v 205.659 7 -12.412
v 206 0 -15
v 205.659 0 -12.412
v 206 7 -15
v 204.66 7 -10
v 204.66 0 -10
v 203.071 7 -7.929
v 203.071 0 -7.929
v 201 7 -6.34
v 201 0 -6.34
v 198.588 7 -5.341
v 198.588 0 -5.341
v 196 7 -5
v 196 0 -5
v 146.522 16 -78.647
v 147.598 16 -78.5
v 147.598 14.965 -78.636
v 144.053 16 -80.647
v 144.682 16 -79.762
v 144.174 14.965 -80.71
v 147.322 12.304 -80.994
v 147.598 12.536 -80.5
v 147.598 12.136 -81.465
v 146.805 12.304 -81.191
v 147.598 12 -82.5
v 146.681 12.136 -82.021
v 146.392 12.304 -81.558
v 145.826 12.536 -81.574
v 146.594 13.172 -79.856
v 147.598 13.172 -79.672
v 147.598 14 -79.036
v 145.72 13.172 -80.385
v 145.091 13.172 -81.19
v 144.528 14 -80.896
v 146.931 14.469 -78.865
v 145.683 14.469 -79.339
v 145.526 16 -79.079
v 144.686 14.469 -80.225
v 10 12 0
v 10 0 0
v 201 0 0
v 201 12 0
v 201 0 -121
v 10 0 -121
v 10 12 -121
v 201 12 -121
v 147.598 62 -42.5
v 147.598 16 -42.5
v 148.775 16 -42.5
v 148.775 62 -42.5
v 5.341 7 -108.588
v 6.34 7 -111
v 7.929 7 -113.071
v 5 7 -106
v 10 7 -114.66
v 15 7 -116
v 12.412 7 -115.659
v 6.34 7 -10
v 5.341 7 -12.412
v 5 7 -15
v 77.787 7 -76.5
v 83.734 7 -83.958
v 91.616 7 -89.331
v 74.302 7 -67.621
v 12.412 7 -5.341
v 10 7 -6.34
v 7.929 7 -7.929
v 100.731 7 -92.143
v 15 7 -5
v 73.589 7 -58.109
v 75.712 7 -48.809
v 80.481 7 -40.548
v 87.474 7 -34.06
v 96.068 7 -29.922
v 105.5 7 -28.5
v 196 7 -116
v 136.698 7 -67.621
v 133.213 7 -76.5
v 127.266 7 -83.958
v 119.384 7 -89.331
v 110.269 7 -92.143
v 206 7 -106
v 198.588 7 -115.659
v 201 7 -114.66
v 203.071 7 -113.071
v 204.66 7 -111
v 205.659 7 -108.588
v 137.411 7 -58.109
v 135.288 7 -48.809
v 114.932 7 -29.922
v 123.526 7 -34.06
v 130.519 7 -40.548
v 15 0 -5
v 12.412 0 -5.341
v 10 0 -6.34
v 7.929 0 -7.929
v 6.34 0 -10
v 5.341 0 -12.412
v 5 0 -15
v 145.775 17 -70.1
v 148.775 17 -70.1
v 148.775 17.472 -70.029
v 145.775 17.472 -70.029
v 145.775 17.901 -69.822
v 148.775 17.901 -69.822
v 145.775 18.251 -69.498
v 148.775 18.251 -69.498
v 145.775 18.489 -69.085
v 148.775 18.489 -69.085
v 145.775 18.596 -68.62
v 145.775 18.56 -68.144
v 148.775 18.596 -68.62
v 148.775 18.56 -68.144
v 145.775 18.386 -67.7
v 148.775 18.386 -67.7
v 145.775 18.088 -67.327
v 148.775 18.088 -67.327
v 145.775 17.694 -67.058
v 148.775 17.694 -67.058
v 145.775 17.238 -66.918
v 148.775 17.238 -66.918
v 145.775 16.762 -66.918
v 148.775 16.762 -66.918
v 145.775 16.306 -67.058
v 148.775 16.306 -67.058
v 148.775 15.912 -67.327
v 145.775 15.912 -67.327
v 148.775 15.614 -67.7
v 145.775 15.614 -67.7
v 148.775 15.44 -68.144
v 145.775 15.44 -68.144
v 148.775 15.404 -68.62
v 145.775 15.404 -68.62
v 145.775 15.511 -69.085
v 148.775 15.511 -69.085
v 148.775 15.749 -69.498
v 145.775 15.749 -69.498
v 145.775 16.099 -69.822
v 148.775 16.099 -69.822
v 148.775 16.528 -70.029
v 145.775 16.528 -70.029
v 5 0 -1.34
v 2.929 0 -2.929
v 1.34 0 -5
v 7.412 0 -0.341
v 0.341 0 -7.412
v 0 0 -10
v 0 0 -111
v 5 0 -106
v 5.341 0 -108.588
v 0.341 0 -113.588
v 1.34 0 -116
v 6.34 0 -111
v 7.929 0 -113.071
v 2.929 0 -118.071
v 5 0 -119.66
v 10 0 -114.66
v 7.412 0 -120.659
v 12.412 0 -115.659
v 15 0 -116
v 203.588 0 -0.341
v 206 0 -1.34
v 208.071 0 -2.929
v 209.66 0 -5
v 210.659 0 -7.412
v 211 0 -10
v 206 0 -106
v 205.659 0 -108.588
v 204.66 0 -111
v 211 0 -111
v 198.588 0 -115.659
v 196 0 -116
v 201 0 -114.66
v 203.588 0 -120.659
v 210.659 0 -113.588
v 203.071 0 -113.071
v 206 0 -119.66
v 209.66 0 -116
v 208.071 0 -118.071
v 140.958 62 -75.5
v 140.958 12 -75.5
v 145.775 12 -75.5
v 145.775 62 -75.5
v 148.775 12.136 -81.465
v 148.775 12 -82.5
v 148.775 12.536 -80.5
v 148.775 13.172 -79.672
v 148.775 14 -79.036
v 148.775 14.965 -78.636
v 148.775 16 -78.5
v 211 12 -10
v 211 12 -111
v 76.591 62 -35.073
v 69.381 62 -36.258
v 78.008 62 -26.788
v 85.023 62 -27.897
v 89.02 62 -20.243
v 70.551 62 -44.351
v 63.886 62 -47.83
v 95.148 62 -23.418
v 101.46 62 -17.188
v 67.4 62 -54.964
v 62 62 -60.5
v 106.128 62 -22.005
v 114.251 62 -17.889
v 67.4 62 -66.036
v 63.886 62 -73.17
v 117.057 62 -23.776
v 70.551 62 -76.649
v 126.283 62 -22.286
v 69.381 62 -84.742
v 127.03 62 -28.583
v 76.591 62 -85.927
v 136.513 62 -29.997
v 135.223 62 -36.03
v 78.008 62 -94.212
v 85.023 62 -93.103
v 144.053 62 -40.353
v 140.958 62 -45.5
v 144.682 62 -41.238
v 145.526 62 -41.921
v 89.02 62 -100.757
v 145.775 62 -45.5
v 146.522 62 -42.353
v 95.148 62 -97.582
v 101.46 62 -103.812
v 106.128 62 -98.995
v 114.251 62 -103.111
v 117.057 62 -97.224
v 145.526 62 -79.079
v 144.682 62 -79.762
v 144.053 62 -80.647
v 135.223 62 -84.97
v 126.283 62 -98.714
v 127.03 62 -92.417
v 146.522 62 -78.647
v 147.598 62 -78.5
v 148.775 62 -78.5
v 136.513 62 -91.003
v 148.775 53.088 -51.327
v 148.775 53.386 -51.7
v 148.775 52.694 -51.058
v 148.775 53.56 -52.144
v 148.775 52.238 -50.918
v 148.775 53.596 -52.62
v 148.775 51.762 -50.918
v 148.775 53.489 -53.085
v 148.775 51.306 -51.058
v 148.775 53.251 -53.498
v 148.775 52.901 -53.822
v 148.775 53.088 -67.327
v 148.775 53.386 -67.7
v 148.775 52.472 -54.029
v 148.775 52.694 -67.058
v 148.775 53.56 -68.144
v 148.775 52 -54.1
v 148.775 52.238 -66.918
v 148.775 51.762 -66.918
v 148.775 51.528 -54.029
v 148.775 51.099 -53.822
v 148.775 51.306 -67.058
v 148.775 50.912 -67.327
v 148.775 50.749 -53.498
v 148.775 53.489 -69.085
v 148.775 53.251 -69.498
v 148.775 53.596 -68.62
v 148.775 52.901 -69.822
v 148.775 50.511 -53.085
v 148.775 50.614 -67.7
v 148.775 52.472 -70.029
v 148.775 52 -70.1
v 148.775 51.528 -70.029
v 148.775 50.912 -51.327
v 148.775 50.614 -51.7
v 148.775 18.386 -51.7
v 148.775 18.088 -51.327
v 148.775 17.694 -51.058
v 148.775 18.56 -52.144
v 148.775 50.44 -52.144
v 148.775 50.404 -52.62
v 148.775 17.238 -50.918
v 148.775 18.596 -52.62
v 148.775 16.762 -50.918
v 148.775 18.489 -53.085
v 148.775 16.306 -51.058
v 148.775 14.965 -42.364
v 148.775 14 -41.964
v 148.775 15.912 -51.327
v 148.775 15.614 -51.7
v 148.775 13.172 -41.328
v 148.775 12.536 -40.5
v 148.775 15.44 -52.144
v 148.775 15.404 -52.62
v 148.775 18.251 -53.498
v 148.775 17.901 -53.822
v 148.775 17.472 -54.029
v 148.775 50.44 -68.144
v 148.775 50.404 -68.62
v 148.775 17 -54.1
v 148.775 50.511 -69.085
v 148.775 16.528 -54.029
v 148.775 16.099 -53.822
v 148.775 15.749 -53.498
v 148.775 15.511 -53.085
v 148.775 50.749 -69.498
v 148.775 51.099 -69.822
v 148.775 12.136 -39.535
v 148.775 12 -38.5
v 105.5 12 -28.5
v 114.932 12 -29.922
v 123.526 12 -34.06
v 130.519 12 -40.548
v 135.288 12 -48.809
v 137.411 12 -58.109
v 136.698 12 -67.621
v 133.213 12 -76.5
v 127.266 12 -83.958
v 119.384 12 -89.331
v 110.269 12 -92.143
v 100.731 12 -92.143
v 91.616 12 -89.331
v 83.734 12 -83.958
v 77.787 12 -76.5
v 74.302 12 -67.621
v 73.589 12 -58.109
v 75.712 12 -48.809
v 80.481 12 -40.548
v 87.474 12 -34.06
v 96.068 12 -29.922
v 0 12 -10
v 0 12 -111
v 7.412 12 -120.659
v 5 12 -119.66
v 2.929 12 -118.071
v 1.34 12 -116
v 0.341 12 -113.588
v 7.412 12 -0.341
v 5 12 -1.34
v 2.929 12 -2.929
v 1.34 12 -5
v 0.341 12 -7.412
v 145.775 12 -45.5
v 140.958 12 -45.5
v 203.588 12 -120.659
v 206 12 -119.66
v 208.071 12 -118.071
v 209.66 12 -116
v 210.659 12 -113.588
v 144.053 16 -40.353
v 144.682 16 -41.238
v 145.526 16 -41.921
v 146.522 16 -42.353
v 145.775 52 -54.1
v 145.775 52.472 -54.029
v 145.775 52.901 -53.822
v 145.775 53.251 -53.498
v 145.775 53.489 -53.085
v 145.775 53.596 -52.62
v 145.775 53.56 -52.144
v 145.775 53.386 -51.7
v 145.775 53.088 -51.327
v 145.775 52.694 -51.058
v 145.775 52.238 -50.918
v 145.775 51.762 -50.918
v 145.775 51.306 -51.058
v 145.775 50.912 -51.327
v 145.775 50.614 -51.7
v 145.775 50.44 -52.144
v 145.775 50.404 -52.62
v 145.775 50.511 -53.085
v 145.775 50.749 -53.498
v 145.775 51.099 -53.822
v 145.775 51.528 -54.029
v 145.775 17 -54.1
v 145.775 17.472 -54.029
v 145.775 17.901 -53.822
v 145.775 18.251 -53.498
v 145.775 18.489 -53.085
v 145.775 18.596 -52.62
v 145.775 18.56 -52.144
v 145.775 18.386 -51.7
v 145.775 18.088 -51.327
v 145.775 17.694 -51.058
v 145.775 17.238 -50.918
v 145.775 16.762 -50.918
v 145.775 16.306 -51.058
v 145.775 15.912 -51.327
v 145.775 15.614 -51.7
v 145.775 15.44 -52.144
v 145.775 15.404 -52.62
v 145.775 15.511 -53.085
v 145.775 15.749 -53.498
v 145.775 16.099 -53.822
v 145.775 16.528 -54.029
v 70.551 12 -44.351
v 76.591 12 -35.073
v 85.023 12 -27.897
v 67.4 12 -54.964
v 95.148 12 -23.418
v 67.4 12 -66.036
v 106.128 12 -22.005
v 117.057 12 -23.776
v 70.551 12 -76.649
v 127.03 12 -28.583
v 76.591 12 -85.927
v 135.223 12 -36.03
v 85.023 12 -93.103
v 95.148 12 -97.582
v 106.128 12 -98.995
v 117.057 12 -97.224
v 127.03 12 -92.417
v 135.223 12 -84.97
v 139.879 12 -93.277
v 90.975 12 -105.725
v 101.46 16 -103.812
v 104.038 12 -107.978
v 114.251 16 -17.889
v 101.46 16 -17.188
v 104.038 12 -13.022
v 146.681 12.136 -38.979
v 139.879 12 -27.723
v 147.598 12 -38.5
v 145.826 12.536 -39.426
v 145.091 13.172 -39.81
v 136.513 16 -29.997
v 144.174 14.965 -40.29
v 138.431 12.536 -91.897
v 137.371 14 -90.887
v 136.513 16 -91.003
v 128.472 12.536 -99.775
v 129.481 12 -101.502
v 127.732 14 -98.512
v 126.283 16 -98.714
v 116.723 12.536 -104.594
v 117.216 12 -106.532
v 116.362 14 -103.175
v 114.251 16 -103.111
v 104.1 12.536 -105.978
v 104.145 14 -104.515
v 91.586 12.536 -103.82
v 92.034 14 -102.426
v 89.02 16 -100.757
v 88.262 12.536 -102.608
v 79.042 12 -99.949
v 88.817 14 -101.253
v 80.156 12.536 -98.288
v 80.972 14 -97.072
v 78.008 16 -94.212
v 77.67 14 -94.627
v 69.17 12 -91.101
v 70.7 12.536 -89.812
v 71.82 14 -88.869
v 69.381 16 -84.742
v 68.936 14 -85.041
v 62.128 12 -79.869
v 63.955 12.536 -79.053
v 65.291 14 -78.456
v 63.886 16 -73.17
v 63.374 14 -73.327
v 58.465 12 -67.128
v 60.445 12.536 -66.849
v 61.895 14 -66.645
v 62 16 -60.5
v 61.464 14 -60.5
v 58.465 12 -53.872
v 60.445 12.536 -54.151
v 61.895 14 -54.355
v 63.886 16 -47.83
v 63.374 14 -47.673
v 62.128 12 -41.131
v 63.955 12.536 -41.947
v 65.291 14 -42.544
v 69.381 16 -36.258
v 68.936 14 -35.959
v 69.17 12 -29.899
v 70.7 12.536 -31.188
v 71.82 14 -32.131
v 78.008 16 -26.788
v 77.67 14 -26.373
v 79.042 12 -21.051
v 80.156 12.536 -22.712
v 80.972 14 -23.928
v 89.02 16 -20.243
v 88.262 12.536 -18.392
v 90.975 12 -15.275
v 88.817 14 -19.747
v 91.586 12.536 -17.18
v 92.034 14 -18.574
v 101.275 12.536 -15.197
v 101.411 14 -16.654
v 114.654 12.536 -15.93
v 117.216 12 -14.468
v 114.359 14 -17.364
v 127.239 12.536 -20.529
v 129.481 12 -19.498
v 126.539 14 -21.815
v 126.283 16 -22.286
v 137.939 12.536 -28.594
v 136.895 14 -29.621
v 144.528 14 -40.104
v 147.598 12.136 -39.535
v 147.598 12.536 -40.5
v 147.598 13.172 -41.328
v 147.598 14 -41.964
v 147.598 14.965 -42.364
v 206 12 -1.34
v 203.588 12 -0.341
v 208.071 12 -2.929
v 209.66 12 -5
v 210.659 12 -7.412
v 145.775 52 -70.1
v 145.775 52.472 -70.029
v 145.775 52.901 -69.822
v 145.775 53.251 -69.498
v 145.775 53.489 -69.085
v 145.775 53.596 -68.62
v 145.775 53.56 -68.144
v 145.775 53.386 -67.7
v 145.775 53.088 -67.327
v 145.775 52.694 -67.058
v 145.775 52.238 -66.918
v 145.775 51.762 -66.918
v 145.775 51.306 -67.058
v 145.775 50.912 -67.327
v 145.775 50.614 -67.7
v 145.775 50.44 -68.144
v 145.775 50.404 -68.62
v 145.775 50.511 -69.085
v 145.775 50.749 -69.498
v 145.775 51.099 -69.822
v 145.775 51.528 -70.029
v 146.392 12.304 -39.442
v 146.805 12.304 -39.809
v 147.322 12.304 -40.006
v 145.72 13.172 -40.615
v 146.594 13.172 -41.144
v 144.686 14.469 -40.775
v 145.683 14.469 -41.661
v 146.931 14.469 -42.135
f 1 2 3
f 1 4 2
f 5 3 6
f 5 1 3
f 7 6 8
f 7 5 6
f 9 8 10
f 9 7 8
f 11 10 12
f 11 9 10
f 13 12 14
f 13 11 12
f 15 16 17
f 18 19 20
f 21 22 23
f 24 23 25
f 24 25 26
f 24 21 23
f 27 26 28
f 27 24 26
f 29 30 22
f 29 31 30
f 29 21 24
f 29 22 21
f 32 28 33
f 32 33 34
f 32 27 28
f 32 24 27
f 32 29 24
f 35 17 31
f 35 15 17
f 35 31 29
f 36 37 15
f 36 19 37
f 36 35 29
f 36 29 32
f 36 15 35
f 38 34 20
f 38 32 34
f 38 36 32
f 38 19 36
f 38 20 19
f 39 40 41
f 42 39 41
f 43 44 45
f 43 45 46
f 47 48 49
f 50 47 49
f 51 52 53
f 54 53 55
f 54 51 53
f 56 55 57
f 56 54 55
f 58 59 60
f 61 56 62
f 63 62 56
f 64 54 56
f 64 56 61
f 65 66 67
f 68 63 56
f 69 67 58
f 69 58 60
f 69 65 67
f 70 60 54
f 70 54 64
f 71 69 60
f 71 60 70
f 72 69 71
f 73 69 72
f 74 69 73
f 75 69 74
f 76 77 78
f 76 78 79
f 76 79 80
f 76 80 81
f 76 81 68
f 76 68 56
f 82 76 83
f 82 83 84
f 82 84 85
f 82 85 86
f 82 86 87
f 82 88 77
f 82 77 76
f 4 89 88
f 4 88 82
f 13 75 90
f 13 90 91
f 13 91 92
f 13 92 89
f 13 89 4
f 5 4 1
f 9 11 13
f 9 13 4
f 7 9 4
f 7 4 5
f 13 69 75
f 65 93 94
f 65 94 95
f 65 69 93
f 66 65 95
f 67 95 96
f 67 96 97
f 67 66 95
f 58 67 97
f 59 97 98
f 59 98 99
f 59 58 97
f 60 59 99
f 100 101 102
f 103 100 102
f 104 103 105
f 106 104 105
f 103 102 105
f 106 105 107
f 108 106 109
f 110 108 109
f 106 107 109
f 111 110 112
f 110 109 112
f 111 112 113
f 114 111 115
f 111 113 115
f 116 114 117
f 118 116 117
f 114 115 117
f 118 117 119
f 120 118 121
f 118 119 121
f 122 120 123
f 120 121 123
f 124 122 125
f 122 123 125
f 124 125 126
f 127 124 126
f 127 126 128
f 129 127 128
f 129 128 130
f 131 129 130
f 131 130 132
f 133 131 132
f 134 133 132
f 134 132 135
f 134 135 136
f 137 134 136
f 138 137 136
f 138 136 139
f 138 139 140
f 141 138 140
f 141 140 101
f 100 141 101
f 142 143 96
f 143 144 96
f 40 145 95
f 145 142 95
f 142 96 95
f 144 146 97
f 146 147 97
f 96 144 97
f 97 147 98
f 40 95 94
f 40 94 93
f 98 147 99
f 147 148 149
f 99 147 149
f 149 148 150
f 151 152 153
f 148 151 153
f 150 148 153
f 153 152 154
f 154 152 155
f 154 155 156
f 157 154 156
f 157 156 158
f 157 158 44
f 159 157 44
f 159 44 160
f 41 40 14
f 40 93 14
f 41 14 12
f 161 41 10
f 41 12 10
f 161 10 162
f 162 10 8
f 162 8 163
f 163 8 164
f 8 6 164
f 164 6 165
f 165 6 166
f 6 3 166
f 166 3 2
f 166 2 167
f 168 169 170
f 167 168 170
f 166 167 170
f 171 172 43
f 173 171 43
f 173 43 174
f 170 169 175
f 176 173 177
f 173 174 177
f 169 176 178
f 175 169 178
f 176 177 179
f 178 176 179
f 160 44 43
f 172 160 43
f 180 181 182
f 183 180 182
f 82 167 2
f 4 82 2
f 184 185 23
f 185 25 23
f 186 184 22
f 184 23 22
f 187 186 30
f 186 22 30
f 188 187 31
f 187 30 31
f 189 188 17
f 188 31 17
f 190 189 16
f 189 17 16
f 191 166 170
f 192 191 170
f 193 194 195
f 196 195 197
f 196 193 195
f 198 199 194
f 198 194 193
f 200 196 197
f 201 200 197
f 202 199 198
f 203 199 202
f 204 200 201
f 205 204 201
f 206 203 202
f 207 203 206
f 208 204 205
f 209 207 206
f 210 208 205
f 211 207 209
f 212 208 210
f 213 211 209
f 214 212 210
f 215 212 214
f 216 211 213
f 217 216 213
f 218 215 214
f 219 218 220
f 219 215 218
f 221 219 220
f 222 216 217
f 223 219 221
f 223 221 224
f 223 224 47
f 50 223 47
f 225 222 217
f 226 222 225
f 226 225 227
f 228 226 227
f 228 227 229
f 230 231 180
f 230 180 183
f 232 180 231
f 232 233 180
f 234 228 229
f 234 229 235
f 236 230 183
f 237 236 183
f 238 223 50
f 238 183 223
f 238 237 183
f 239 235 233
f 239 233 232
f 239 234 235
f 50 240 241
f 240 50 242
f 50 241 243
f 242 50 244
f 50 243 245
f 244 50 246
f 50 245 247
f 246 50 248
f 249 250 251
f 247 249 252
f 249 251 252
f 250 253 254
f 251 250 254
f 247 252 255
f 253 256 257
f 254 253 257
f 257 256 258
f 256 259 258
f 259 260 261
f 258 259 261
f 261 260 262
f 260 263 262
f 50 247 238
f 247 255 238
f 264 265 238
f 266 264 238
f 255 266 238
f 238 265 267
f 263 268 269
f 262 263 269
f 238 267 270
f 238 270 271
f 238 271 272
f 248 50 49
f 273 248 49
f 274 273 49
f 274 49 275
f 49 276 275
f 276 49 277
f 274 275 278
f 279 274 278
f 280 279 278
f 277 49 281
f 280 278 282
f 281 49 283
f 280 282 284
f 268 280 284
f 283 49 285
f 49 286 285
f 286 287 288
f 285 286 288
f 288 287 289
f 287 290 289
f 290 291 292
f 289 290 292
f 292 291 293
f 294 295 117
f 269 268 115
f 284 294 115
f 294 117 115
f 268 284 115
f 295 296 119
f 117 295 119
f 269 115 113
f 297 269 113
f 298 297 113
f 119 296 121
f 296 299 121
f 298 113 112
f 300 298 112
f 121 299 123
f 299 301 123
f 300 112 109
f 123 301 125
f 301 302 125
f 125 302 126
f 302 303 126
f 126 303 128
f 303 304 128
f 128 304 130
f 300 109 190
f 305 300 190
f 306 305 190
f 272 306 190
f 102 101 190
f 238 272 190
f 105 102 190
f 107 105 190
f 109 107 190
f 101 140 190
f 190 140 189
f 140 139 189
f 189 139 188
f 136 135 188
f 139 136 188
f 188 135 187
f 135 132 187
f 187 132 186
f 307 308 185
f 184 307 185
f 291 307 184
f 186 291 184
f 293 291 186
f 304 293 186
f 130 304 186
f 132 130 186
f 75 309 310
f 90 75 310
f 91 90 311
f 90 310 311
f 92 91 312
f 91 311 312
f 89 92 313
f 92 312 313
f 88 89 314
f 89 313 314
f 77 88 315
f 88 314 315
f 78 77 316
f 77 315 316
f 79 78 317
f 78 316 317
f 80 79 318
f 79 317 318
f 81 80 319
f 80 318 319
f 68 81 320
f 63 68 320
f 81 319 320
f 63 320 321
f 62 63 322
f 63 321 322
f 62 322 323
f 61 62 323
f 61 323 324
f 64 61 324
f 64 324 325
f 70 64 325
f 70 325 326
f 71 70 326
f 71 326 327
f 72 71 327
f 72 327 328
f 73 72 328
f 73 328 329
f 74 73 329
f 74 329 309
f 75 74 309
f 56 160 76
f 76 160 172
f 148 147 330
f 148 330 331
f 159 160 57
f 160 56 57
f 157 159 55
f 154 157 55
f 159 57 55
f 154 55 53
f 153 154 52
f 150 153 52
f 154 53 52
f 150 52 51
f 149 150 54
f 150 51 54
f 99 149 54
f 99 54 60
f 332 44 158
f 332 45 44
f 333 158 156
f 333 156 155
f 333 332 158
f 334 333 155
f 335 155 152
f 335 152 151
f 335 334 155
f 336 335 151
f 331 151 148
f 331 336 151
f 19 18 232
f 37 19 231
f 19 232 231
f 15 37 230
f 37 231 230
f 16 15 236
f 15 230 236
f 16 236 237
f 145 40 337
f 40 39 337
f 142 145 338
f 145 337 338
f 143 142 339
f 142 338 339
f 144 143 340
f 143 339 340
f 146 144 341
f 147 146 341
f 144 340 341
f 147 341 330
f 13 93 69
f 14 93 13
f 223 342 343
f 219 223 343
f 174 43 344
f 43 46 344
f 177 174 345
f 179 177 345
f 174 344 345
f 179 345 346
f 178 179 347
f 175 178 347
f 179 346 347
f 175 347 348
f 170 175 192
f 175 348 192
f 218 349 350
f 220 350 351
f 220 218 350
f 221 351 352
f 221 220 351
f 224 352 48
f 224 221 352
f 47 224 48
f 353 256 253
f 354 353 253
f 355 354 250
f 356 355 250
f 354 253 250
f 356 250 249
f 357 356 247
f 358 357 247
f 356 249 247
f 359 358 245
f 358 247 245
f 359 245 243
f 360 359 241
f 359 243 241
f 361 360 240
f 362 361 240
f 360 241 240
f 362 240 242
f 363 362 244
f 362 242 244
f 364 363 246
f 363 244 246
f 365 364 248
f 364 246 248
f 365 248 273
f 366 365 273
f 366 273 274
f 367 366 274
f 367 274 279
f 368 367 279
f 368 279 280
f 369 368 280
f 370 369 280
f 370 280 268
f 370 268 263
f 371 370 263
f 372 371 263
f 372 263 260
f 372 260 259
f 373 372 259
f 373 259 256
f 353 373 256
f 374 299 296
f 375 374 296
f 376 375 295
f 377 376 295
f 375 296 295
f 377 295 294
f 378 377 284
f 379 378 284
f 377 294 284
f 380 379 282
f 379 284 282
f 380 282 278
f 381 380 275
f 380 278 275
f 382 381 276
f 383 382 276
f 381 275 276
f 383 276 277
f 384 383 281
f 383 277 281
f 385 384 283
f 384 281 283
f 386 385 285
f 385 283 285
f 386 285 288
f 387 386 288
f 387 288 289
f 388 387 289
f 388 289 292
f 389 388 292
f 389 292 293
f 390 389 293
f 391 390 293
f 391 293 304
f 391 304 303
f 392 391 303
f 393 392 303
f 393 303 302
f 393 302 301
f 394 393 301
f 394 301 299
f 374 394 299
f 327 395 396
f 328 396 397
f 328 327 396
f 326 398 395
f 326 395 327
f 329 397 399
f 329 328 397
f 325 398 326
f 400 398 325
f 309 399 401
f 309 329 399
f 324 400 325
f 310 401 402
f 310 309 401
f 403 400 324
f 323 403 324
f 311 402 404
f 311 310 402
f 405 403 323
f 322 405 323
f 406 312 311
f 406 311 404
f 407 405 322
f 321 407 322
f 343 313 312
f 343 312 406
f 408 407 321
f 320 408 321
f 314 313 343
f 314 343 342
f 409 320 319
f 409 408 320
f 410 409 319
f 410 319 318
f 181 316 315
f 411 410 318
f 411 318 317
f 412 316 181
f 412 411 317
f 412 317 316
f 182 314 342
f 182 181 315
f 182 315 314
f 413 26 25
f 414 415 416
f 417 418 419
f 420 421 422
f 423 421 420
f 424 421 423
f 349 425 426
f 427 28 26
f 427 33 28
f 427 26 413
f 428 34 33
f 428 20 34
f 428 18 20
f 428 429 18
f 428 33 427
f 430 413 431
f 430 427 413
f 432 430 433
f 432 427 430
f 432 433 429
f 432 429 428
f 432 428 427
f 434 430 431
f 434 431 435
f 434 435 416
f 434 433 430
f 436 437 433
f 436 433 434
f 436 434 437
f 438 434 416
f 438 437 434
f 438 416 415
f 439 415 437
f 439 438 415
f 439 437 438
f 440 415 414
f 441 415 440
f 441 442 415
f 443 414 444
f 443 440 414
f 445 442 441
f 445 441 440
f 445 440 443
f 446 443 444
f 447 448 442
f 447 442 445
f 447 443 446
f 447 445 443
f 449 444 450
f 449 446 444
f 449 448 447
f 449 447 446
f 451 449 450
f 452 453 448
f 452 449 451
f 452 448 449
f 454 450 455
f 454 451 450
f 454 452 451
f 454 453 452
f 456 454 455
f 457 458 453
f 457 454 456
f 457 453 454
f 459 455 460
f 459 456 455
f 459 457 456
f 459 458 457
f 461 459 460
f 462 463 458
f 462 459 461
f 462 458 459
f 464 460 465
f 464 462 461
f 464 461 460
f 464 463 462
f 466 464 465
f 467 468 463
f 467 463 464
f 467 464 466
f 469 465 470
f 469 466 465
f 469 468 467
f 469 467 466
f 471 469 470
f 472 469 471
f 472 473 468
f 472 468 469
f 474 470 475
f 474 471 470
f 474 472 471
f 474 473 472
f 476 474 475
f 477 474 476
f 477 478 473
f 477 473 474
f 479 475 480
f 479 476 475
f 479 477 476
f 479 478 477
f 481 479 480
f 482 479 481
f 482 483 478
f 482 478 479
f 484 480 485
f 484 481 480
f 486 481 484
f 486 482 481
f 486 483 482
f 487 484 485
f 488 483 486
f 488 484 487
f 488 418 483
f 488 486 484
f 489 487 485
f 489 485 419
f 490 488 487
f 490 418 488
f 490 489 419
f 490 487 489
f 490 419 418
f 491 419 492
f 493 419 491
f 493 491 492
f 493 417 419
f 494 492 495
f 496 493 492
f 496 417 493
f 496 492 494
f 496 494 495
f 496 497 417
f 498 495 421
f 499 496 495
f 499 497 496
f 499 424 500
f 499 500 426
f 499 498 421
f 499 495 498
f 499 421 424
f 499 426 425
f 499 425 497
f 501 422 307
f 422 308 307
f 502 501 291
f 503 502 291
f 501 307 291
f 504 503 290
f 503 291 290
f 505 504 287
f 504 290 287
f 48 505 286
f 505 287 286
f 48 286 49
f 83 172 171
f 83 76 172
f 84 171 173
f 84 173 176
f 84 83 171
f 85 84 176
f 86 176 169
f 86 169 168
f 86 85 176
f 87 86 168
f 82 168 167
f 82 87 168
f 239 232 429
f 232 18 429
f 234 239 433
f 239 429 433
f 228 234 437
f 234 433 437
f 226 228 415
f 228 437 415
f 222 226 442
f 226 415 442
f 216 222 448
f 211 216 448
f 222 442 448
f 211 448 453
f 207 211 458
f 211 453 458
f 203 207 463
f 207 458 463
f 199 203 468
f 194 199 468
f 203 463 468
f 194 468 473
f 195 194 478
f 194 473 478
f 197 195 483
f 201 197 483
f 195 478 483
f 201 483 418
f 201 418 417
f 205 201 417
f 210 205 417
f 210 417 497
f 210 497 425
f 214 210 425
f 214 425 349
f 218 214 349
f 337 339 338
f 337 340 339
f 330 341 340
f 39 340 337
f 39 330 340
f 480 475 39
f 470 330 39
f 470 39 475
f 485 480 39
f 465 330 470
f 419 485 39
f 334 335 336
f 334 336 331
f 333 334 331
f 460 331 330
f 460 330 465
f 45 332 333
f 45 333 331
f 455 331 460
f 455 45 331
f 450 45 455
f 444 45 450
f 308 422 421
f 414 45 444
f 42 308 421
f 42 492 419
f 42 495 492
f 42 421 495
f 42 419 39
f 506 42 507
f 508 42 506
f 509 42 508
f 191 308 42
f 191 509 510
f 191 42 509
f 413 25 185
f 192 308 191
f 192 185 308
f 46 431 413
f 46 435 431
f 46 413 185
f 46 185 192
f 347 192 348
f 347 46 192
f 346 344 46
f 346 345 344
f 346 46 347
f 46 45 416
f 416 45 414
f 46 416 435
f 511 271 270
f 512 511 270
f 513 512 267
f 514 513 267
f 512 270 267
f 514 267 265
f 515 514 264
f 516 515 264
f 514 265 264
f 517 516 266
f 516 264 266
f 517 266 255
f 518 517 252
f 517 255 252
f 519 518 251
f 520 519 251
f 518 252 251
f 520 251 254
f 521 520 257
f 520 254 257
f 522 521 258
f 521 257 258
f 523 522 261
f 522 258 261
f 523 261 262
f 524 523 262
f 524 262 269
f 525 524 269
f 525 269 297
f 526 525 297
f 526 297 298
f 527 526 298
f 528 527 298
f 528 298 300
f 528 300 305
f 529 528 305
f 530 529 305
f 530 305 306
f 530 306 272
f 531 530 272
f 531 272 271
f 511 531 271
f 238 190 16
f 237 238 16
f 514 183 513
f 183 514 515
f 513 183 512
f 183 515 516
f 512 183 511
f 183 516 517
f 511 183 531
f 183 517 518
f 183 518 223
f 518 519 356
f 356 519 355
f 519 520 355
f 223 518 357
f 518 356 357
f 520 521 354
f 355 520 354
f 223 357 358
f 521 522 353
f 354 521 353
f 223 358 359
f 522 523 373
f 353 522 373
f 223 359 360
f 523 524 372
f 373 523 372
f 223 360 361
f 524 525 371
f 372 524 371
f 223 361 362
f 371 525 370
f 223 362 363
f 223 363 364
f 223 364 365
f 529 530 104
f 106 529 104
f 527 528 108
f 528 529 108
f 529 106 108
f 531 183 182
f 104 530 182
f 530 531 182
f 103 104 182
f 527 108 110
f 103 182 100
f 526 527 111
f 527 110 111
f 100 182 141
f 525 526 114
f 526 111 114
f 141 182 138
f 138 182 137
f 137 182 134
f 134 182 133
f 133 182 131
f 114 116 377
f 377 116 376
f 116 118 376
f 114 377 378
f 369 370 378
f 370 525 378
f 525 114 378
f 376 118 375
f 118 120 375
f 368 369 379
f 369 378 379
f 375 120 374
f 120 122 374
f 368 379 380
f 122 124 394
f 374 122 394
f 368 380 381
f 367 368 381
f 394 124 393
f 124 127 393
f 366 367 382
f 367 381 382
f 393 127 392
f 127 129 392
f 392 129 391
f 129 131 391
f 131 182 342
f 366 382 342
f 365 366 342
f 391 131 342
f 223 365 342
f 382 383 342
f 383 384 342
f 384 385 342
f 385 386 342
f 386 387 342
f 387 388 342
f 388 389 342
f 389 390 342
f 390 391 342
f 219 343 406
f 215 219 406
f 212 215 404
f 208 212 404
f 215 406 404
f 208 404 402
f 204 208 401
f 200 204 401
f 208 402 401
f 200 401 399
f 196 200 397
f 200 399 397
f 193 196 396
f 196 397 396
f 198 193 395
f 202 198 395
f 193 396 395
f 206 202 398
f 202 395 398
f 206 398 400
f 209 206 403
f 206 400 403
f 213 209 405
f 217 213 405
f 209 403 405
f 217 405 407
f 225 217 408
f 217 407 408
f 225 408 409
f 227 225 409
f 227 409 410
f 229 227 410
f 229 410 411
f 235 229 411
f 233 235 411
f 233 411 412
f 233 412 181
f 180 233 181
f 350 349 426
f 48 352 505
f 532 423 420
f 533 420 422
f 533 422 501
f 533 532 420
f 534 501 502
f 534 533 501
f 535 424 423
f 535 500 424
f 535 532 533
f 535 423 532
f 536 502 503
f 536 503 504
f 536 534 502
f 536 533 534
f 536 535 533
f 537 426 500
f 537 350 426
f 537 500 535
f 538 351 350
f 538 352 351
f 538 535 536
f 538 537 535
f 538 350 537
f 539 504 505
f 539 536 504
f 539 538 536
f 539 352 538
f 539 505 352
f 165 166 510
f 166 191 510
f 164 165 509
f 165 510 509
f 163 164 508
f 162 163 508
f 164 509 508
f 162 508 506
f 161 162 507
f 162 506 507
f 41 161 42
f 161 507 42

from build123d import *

# Parameters (mm, degrees)
SKETCH1_W           = 211
SKETCH1_H           = 121
BOSS_EXTRUDE1_DEPTH = 12
SKETCH2_W           = 201
SKETCH2_H           = 111
CUT_EXTRUDE1_DEPTH  = 7
SKETCH3_R           = 32
CUT_EXTRUDE2_DEPTH  = 244.52823245
BOSS_EXTRUDE2_DEPTH = 50
SKETCH5_R           = 1.6
CUT_EXTRUDE3_DEPTH  = 6
FILLET1_R           = 4
FILLET2_R           = 10


with BuildPart() as part:
    # Sketch1 → Boss-Extrude1 (new body)
    with BuildSketch(Plane(origin=(0, 0, 0), x_dir=(1, 0, 0), z_dir=(0, 1, 0))):
        with Locations((105.5, 60.5)):
            Rectangle(SKETCH1_W, SKETCH1_H)
    extrude(amount=BOSS_EXTRUDE1_DEPTH)

    # Sketch2 → Cut-Extrude1 (cut)
    with BuildSketch(Plane.XZ):
        with Locations((105.5, -60.5)):
            Rectangle(SKETCH2_W, SKETCH2_H)
    extrude(amount=-CUT_EXTRUDE1_DEPTH, mode=Mode.SUBTRACT)

    # Sketch3 → Cut-Extrude2 (cut, through all)
    with BuildSketch(Plane(origin=(0, 12, 0), x_dir=(1, 0, 0), z_dir=(0, 1, 0))):
        with Locations(Location((105.5, 60.5, 0), (0, 0, 270))):
            Circle(SKETCH3_R)
    extrude(amount=-CUT_EXTRUDE2_DEPTH, mode=Mode.SUBTRACT)

    # Sketch4 → Boss-Extrude2 (add)
    with BuildSketch(Plane(origin=(0, 12, 0), x_dir=(1, 0, 0), z_dir=(0, 1, 0))):
        with BuildLine():
            ThreePointArc((140.957721303, 45.5), (67, 60.5), (140.957721303, 75.5))
            Line((140.957721303, 75.5), (145.775366264, 75.5))
            Line((145.775366264, 75.5), (146.331972766, 75.5))
            ThreePointArc((146.331972766, 75.5), (145.74451839, 77.011472968), (145.101136347, 78.5))
            ThreePointArc((145.101136347, 78.5), (62, 60.5), (145.101136347, 42.5))
            ThreePointArc((145.101136347, 42.5), (145.74451839, 43.988527032), (146.331972766, 45.5))
            Line((146.331972766, 45.5), (145.775366264, 45.5))
            Line((145.775366264, 45.5), (140.957721303, 45.5))
        make_face()
        with BuildLine():
            Line((146.331972766, 75.5), (145.775366264, 75.5))
            Line((145.775366264, 75.5), (145.775366264, 45.5))
            Line((145.775366264, 45.5), (146.331972766, 45.5))
            ThreePointArc((146.331972766, 45.5), (147.885391427, 50.715900981), (148.775366264, 56.084949069))
            Line((148.775366264, 56.084949069), (148.775366264, 64.915050931))
            ThreePointArc((148.775366264, 64.915050931), (147.885391427, 70.284099019), (146.331972766, 75.5))
        make_face()
        with BuildLine():
            ThreePointArc((145.101136347, 78.5), (145.74451839, 77.011472968), (146.331972766, 75.5))
            Line((146.331972766, 75.5), (148.775366264, 75.5))
            Line((148.775366264, 75.5), (148.775366264, 78.5))
            Line((148.775366264, 78.5), (145.101136347, 78.5))
        make_face()
        with BuildLine():
            Line((148.775366264, 75.5), (146.331972766, 75.5))
            ThreePointArc((146.331972766, 75.5), (147.885391427, 70.284099019), (148.775366264, 64.915050931))
            Line((148.775366264, 64.915050931), (148.775366264, 75.5))
        make_face()
        with BuildLine():
            ThreePointArc((148.775366264, 56.084949069), (147.885391427, 50.715900981), (146.331972766, 45.5))
            Line((146.331972766, 45.5), (148.775366264, 45.5))
            Line((148.775366264, 45.5), (148.775366264, 56.084949069))
        make_face()
        with BuildLine():
            Line((148.775366264, 45.5), (146.331972766, 45.5))
            ThreePointArc((146.331972766, 45.5), (145.74451839, 43.988527032), (145.101136347, 42.5))
            Line((145.101136347, 42.5), (148.775366264, 42.5))
            Line((148.775366264, 42.5), (148.775366264, 45.5))
        make_face()
    extrude(amount=BOSS_EXTRUDE2_DEPTH)

    # Sketch5 → Cut-Extrude3 (cut)
    with BuildSketch(Plane(origin=(148.775366264, 0, 0), x_dir=(0, 0, -1), z_dir=(1, 0, 0))):
        with Locations((52.5, 52)):
            Circle(SKETCH5_R)
        with Locations((68.5, 52)):
            Circle(SKETCH5_R)
        with Locations((68.5, 17)):
            Circle(SKETCH5_R)
        with Locations((52.5, 17)):
            Circle(SKETCH5_R)
    extrude(amount=-CUT_EXTRUDE3_DEPTH, mode=Mode.SUBTRACT)

    # Fillet1
    fillet1_edges = [part.edges().sort_by_distance(p)[0] for p in [
        (146.938251306, 12, -42.5),
        (145.101136347, 37, -42.5),
        (62, 12, -60.5),
        (145.101136347, 37, -78.5),
        (146.938251306, 12, -78.5),
    ]]
    fillet(fillet1_edges, radius=FILLET1_R)

    # Fillet2
    fillet2_edges = [part.edges().sort_by_distance(p)[0] for p in [
        (5, 3.5, -116),
        (5, 3.5, -5),
        (206, 3.5, -5),
        (206, 3.5, -116),
        (0, 6, -121),
        (211, 6, -121),
        (211, 6, 0),
        (0, 6, 0),
    ]]
    fillet(fillet2_edges, radius=FILLET2_R)


solid = part.part
